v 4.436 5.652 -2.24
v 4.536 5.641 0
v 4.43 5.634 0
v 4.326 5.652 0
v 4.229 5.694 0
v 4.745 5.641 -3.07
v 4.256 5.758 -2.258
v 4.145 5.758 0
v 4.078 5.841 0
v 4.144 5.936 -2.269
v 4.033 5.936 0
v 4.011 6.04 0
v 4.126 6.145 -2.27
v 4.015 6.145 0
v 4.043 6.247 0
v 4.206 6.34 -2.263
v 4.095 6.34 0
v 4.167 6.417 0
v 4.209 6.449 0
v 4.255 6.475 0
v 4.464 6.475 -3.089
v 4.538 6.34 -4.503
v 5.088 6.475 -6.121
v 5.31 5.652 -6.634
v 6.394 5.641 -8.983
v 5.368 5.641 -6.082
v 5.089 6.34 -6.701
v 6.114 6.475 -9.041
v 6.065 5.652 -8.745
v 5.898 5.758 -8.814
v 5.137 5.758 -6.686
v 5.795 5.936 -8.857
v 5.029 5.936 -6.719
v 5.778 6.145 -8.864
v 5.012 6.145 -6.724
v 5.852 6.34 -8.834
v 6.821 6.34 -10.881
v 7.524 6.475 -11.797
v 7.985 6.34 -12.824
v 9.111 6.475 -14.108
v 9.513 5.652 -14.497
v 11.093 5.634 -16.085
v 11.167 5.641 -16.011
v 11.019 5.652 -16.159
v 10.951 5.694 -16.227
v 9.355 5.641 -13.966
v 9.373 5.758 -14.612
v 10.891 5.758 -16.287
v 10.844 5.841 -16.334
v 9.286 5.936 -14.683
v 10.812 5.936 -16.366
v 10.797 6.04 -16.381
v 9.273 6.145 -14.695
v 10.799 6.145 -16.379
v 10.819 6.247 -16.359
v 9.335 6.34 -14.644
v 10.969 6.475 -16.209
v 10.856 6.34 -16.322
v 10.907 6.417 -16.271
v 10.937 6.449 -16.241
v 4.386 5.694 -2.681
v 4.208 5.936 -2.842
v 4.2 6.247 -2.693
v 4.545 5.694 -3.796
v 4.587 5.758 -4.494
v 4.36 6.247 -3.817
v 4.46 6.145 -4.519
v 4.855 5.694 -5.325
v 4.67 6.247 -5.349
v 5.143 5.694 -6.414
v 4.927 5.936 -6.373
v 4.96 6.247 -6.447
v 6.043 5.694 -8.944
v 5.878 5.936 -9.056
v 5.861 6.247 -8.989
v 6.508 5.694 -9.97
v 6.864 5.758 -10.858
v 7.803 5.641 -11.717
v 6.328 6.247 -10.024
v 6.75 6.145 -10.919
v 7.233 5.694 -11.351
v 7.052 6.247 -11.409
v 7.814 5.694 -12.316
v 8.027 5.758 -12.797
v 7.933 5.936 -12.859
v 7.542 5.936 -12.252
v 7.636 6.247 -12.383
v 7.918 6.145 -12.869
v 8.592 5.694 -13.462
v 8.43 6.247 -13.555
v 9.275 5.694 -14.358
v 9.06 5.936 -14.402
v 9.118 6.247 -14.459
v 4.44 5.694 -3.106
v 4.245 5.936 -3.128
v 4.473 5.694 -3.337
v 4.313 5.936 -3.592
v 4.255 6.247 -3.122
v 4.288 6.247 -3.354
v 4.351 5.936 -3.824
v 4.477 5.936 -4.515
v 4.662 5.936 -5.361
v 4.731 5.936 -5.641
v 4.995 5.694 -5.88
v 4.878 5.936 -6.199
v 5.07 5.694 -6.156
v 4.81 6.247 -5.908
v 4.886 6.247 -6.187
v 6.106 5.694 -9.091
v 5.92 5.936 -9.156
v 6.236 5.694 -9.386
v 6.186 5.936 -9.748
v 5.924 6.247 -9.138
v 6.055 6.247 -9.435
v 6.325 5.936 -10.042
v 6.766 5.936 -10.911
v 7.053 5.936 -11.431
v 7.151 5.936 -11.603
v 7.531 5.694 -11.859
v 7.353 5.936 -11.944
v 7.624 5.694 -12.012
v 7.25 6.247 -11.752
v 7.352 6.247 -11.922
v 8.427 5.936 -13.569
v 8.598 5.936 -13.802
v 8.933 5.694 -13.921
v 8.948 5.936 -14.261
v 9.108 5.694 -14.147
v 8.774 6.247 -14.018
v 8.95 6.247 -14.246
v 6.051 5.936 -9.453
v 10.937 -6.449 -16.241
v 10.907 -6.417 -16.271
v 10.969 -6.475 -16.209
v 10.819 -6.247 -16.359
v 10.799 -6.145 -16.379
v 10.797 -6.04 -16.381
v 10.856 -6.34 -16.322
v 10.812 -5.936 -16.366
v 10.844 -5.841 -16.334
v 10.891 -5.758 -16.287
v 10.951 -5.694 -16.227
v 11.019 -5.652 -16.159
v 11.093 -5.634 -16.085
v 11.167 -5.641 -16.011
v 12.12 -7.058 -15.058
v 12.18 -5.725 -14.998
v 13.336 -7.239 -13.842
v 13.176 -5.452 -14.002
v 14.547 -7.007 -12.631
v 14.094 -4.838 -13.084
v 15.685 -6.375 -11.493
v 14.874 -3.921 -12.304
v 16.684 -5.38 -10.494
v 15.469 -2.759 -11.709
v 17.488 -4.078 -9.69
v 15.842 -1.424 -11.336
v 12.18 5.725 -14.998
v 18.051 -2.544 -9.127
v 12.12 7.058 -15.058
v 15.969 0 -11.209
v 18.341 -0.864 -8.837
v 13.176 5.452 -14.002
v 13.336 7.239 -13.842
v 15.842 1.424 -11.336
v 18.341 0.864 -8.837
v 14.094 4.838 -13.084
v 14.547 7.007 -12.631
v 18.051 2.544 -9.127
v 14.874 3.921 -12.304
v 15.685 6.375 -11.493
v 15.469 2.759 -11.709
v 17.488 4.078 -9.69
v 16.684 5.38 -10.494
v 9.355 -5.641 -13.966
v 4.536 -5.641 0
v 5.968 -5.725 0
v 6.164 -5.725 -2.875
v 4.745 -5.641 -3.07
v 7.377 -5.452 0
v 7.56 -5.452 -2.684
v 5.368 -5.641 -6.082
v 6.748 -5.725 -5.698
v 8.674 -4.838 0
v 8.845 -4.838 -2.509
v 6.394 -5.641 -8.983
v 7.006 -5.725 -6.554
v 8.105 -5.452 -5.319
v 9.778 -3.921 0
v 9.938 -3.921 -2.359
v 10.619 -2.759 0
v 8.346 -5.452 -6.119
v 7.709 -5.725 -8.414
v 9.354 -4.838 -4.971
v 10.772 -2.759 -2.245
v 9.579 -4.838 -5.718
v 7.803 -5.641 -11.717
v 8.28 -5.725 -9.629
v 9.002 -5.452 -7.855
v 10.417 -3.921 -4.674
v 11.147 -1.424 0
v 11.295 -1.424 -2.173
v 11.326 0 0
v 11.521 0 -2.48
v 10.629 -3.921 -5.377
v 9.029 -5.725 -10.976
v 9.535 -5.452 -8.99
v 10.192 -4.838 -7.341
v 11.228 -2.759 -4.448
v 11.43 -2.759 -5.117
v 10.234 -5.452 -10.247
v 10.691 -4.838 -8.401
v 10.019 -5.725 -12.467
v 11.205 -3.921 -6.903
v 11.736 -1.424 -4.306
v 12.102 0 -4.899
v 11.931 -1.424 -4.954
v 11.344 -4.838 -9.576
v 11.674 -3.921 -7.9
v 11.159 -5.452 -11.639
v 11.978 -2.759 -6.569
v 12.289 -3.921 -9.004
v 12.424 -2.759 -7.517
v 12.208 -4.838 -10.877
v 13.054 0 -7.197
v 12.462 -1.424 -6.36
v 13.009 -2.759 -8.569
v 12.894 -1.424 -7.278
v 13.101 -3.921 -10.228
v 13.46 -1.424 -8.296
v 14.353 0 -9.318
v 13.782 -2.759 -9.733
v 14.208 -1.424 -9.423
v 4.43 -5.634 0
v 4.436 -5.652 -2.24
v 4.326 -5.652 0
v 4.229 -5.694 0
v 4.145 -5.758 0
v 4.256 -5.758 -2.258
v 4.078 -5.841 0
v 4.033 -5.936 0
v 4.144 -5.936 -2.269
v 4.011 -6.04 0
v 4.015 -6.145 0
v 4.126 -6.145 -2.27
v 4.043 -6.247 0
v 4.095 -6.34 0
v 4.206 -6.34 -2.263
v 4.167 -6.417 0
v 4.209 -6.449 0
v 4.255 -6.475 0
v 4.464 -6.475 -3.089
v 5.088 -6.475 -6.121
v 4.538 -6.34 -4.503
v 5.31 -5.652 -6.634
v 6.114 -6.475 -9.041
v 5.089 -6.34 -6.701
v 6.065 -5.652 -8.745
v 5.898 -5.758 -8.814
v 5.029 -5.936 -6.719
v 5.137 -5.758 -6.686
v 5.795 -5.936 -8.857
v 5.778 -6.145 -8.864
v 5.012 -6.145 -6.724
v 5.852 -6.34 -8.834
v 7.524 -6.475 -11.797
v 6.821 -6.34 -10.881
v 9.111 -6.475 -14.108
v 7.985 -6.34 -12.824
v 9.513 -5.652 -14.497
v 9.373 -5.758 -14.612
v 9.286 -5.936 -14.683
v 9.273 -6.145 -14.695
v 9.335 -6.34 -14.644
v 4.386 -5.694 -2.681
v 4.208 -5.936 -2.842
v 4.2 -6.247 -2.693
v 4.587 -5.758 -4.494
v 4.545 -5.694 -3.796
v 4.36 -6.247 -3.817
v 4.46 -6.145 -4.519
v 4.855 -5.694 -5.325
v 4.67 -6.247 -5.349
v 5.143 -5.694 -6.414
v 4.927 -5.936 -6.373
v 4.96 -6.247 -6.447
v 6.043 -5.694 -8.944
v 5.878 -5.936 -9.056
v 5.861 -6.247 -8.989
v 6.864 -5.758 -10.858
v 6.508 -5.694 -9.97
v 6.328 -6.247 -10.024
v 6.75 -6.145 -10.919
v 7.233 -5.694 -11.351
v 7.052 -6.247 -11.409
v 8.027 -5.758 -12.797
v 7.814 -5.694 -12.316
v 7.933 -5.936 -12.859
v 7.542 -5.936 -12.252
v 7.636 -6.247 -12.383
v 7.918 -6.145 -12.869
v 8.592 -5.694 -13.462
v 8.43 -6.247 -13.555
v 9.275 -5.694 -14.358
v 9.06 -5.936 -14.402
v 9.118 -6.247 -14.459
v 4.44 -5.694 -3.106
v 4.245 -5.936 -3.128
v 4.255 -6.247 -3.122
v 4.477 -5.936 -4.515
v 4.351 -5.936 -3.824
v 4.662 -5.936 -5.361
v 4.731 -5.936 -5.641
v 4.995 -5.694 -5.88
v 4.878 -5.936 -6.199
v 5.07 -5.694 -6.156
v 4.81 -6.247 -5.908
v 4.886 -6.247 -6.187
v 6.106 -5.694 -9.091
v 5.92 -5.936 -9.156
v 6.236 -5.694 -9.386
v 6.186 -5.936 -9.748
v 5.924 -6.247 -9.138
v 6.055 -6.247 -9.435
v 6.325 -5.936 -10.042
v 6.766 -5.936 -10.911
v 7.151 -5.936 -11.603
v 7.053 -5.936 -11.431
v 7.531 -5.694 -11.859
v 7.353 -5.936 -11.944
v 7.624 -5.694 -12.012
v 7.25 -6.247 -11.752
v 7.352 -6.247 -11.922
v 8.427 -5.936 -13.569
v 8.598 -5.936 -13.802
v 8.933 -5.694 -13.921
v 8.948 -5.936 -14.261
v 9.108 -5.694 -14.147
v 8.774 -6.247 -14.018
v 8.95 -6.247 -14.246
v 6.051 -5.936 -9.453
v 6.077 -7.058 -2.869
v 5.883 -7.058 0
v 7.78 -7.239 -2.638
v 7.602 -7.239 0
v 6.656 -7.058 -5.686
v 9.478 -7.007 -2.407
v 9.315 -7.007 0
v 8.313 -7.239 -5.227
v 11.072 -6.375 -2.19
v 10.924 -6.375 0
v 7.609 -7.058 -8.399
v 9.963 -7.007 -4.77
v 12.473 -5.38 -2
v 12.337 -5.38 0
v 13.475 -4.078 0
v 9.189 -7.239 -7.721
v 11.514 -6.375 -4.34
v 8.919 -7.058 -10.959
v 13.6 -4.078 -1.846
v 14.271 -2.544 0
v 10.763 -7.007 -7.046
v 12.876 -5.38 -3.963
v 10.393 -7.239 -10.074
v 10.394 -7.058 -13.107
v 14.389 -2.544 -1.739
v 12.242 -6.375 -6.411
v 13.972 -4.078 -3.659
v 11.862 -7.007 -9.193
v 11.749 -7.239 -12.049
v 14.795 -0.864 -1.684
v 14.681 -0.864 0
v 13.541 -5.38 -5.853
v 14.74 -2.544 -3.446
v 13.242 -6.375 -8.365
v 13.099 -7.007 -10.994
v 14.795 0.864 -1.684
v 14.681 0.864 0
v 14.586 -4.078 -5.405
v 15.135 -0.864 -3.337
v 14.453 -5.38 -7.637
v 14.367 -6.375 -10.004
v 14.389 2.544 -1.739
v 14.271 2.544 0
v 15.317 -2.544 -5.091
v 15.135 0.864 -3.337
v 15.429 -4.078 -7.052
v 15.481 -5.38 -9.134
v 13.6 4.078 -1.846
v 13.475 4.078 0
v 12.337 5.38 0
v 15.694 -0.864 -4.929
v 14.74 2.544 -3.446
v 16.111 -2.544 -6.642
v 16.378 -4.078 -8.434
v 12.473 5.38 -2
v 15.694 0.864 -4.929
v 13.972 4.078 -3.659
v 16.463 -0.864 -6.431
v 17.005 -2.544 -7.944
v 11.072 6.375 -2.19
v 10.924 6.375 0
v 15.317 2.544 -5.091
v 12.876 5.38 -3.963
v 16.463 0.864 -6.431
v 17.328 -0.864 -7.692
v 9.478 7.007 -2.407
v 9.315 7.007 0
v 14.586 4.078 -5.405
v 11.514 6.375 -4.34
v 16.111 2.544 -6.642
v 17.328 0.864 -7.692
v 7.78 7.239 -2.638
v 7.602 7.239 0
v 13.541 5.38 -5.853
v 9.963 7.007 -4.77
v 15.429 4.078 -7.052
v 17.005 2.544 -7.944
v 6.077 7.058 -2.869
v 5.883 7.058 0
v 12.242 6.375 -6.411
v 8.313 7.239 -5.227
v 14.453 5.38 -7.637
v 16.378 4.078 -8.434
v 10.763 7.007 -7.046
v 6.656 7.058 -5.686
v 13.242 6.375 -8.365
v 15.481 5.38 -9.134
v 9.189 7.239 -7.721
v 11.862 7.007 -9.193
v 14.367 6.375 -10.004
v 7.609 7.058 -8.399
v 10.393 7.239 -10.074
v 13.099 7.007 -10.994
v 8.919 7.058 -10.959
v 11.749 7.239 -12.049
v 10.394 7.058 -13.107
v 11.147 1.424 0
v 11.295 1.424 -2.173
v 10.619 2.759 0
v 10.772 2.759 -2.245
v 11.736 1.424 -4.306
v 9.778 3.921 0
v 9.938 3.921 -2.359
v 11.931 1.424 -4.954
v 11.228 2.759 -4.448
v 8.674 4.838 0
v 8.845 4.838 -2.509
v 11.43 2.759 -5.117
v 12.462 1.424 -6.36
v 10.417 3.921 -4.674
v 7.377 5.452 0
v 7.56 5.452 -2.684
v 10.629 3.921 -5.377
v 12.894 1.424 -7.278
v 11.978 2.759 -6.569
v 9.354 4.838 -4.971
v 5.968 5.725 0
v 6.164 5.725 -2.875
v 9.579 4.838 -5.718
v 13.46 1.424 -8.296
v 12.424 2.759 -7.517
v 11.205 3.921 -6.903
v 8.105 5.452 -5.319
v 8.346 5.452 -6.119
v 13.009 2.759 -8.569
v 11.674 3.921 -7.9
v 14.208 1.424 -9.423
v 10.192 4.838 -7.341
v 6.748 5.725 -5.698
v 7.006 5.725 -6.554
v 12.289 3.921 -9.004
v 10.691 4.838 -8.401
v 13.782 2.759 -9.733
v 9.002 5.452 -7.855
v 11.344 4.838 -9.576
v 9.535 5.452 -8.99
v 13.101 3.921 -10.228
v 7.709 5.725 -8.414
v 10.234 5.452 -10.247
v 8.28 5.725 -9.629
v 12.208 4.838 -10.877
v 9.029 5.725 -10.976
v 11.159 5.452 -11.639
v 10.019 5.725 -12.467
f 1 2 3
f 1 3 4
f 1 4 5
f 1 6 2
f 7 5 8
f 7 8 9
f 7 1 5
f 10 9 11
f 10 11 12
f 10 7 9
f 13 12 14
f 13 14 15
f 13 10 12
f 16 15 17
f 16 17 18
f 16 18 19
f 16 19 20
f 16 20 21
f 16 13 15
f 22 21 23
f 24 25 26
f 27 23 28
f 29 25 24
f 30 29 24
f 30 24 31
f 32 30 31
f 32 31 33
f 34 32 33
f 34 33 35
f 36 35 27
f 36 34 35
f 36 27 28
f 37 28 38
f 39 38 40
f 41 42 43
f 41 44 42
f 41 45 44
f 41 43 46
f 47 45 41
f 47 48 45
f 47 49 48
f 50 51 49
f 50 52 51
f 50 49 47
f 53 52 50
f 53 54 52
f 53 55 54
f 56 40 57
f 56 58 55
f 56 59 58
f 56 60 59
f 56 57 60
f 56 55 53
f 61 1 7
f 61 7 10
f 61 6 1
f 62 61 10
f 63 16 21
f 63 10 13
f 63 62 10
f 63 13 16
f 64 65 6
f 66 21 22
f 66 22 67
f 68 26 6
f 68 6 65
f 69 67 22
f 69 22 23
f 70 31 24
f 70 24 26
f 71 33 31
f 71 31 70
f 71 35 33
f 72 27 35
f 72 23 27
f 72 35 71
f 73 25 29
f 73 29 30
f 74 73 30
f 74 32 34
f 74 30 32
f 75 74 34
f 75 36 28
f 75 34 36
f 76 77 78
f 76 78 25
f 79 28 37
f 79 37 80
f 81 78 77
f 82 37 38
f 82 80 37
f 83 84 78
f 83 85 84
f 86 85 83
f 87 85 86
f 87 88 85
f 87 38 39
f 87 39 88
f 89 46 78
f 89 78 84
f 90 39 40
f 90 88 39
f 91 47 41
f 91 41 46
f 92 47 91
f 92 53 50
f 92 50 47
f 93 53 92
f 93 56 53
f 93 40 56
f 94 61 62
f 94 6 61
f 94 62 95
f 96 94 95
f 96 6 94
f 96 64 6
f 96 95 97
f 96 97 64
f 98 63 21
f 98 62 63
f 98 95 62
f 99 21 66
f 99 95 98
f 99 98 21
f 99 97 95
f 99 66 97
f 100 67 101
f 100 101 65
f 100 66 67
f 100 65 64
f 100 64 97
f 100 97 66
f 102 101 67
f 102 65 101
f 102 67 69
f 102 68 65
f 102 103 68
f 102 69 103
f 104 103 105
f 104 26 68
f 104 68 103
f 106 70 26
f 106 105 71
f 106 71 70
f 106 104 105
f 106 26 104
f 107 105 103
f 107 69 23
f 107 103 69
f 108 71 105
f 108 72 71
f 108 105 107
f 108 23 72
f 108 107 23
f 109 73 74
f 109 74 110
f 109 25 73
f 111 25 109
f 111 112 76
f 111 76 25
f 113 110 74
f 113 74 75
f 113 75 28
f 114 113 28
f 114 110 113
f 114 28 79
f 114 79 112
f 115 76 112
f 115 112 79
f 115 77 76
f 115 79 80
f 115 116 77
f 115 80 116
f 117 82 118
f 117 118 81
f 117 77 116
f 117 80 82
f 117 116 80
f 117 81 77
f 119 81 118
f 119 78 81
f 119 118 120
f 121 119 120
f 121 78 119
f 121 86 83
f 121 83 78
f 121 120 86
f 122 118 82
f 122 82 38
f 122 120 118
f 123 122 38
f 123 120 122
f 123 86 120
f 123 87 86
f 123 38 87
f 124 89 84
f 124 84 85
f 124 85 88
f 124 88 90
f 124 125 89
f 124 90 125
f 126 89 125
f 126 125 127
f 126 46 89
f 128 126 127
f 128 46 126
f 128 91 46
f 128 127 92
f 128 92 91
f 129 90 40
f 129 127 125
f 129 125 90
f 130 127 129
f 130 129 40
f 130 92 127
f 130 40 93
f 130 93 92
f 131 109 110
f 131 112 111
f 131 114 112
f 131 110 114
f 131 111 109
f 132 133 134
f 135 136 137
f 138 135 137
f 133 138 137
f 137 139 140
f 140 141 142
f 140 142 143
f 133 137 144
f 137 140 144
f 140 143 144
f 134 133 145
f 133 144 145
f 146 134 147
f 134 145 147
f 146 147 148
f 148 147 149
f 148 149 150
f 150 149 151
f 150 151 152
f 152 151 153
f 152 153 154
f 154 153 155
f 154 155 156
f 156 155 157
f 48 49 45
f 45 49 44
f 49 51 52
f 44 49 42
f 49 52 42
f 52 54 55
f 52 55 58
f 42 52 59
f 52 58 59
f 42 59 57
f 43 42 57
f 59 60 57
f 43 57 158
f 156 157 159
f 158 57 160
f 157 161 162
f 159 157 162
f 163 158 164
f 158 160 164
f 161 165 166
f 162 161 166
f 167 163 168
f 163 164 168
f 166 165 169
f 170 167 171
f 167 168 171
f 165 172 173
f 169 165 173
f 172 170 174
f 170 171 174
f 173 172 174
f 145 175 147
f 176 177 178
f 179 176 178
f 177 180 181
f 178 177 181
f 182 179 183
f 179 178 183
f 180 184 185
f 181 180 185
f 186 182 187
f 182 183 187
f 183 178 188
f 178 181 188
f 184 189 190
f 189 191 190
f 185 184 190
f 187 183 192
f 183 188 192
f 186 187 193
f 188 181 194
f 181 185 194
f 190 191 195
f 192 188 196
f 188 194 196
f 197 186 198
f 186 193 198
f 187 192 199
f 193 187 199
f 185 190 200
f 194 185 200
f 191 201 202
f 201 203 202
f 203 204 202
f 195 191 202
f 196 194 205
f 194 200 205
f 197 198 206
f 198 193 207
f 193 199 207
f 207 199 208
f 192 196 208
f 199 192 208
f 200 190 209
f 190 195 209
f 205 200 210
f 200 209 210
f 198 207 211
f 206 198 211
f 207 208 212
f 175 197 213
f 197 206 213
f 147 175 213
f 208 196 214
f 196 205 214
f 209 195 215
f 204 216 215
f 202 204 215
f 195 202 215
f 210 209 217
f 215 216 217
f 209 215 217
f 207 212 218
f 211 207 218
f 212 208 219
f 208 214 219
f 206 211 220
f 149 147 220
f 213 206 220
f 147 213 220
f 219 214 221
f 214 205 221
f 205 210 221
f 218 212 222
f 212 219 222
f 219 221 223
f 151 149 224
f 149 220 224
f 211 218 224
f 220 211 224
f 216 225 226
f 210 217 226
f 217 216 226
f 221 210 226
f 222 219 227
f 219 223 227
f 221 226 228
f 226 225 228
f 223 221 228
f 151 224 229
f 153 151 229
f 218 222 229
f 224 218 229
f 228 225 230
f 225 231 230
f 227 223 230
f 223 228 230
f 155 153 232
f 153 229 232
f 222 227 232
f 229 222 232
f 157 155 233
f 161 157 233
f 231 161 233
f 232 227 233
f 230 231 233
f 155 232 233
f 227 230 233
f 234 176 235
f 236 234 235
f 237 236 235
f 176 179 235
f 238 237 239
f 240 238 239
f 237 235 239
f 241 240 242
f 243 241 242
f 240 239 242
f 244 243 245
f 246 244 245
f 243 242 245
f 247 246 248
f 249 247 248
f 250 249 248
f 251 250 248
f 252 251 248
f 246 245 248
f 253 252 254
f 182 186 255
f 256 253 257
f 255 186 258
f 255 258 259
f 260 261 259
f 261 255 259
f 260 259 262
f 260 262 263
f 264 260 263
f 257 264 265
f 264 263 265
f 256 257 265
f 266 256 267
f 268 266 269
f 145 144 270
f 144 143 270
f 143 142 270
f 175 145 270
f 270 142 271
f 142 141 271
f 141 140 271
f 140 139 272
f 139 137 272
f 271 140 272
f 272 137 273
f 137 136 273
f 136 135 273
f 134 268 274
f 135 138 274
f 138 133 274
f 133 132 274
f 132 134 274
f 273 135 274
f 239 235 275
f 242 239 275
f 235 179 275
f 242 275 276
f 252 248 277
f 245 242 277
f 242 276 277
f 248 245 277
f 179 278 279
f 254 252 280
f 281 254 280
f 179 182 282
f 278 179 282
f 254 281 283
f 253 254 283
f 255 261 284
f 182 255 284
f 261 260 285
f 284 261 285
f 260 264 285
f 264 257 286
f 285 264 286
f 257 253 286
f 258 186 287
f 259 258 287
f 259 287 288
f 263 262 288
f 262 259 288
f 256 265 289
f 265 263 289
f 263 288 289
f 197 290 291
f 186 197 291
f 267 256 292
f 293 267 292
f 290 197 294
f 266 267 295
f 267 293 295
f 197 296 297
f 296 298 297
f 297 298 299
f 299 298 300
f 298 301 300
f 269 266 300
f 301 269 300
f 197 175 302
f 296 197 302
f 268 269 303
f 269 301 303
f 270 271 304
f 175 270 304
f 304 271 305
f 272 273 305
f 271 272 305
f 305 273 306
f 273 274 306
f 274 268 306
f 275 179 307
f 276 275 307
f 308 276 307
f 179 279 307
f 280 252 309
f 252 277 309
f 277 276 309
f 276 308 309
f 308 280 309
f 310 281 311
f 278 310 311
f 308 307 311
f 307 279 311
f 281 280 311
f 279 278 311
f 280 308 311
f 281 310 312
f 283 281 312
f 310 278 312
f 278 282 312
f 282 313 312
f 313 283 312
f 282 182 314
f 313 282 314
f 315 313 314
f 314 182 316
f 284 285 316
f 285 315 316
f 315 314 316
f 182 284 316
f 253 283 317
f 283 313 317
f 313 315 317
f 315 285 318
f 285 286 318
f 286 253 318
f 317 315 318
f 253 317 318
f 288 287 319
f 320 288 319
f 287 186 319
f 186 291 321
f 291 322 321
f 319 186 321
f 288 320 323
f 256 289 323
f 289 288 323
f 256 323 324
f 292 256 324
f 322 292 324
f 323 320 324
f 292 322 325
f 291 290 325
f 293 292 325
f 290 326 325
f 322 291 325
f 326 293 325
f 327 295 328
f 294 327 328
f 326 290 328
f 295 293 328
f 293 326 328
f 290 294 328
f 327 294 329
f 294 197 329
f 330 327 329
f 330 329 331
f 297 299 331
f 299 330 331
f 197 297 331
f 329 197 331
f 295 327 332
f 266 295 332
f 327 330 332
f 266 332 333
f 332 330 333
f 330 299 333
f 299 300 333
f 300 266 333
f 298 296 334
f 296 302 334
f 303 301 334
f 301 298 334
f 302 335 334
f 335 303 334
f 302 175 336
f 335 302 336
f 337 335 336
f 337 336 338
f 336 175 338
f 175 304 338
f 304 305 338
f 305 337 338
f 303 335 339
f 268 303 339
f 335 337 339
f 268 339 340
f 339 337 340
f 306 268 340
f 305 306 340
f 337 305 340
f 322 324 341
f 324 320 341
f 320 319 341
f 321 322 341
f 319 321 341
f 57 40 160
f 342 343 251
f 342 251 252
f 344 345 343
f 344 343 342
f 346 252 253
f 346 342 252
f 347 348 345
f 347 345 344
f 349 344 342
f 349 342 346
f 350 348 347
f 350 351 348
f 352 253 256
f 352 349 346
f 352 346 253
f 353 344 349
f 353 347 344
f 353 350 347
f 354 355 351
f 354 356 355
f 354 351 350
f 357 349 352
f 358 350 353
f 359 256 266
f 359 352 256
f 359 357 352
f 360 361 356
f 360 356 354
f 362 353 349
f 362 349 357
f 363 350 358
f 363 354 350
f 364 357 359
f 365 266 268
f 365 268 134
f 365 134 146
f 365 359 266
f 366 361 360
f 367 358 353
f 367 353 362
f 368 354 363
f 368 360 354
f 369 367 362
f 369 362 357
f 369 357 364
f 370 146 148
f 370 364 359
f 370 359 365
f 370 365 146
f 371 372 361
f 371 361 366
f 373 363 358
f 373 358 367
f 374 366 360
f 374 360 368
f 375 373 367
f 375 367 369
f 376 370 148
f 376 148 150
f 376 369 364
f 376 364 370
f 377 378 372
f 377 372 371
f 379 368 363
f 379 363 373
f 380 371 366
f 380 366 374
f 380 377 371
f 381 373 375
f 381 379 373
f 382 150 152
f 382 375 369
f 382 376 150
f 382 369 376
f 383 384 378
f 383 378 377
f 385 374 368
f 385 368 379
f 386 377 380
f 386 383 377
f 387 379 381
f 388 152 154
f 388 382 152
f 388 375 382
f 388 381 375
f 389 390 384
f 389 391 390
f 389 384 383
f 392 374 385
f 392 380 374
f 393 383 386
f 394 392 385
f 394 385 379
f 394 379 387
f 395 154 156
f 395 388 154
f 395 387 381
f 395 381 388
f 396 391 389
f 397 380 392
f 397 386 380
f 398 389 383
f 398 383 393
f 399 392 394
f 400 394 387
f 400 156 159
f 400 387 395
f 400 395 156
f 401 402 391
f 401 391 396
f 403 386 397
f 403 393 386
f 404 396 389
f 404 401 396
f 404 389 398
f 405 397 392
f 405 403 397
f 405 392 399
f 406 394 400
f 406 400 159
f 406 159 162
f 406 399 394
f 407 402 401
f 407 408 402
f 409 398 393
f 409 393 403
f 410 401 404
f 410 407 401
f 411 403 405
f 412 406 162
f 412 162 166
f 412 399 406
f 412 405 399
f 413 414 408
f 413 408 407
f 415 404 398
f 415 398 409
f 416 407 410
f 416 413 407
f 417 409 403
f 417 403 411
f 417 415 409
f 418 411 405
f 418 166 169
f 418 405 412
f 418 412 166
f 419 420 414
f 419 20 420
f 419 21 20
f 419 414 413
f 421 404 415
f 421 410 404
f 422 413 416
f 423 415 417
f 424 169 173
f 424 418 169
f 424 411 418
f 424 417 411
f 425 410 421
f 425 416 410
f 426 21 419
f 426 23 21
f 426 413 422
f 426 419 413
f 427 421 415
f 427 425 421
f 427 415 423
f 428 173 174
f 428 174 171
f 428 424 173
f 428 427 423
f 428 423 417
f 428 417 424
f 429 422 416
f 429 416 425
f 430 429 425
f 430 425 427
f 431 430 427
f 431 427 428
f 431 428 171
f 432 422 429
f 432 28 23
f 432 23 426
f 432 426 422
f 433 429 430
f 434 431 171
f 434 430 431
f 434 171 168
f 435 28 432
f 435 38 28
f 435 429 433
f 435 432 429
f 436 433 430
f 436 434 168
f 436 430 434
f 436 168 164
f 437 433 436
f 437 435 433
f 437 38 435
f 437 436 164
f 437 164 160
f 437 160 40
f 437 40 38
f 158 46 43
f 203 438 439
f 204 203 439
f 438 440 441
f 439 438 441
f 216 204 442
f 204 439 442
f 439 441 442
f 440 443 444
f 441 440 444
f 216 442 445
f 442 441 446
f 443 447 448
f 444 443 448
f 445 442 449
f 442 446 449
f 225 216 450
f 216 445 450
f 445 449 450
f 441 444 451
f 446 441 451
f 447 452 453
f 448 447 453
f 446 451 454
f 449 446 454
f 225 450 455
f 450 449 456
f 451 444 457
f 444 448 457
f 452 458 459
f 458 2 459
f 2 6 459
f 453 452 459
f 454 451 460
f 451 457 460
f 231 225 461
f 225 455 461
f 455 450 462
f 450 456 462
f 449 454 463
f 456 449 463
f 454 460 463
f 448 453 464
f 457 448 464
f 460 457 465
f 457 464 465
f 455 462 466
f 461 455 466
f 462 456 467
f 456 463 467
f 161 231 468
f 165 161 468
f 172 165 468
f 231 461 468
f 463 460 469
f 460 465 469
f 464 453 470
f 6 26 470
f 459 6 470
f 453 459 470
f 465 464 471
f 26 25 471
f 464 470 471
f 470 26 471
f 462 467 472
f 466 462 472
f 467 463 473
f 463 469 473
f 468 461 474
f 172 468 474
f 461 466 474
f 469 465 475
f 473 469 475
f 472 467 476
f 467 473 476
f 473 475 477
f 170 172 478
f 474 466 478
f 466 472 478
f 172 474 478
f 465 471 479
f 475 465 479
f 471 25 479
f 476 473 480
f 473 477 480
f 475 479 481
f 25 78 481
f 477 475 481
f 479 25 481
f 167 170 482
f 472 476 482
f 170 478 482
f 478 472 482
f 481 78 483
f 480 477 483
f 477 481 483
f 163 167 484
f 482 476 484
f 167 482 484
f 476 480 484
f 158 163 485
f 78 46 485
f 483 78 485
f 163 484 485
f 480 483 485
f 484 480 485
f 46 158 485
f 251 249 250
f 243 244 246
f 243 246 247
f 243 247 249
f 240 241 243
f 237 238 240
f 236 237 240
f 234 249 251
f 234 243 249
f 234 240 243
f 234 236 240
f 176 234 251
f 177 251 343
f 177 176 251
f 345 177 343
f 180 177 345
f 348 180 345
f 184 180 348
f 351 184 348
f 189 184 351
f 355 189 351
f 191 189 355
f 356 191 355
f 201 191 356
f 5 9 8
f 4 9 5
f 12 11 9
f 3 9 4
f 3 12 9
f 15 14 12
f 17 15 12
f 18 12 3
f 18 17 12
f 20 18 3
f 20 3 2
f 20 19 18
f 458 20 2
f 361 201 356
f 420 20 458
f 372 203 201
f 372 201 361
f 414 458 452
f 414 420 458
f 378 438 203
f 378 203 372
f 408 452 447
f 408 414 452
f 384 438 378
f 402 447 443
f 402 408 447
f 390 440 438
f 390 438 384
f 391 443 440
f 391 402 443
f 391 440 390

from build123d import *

# Parameters (mm, degrees)
FILLET1_R = 0.4445


with BuildPart() as part:
    # Sweep1: sweep along a path in Sketch1
    with BuildLine(Plane(origin=(0, 0, 0), x_dir=(1, 0, 0), z_dir=(0, 1, 0))) as sweep1_path:
        ThreePointArc((5.588, 0), (7.231440893, 8.262135305), (11.911564594, 15.266435406))
    # Sketch2 → Sweep1 (sweep)
    with BuildSketch(Plane.XY):
        with BuildLine():
            ThreePointArc((11.326, 0), (7.714353036, 5.329471528), (1.425941872, 3.949926093))
            ThreePointArc((1.425941872, 3.949926093), (14.732551814, 0), (1.425941872, -3.949926093))
            ThreePointArc((1.425941872, -3.949926093), (7.714353036, -5.329471528), (11.326, 0))
        make_face()
    sweep(path=sweep1_path.line)

    # Fillet1
    fillet1_edges = [part.edges().sort_by_distance(p)[0] for p in [
        (3.386200576, 3.949926093, -9.854885995),
        (3.386200576, -3.949926093, -9.854885995),
    ]]
    fillet(fillet1_edges, radius=FILLET1_R)


solid = part.part
